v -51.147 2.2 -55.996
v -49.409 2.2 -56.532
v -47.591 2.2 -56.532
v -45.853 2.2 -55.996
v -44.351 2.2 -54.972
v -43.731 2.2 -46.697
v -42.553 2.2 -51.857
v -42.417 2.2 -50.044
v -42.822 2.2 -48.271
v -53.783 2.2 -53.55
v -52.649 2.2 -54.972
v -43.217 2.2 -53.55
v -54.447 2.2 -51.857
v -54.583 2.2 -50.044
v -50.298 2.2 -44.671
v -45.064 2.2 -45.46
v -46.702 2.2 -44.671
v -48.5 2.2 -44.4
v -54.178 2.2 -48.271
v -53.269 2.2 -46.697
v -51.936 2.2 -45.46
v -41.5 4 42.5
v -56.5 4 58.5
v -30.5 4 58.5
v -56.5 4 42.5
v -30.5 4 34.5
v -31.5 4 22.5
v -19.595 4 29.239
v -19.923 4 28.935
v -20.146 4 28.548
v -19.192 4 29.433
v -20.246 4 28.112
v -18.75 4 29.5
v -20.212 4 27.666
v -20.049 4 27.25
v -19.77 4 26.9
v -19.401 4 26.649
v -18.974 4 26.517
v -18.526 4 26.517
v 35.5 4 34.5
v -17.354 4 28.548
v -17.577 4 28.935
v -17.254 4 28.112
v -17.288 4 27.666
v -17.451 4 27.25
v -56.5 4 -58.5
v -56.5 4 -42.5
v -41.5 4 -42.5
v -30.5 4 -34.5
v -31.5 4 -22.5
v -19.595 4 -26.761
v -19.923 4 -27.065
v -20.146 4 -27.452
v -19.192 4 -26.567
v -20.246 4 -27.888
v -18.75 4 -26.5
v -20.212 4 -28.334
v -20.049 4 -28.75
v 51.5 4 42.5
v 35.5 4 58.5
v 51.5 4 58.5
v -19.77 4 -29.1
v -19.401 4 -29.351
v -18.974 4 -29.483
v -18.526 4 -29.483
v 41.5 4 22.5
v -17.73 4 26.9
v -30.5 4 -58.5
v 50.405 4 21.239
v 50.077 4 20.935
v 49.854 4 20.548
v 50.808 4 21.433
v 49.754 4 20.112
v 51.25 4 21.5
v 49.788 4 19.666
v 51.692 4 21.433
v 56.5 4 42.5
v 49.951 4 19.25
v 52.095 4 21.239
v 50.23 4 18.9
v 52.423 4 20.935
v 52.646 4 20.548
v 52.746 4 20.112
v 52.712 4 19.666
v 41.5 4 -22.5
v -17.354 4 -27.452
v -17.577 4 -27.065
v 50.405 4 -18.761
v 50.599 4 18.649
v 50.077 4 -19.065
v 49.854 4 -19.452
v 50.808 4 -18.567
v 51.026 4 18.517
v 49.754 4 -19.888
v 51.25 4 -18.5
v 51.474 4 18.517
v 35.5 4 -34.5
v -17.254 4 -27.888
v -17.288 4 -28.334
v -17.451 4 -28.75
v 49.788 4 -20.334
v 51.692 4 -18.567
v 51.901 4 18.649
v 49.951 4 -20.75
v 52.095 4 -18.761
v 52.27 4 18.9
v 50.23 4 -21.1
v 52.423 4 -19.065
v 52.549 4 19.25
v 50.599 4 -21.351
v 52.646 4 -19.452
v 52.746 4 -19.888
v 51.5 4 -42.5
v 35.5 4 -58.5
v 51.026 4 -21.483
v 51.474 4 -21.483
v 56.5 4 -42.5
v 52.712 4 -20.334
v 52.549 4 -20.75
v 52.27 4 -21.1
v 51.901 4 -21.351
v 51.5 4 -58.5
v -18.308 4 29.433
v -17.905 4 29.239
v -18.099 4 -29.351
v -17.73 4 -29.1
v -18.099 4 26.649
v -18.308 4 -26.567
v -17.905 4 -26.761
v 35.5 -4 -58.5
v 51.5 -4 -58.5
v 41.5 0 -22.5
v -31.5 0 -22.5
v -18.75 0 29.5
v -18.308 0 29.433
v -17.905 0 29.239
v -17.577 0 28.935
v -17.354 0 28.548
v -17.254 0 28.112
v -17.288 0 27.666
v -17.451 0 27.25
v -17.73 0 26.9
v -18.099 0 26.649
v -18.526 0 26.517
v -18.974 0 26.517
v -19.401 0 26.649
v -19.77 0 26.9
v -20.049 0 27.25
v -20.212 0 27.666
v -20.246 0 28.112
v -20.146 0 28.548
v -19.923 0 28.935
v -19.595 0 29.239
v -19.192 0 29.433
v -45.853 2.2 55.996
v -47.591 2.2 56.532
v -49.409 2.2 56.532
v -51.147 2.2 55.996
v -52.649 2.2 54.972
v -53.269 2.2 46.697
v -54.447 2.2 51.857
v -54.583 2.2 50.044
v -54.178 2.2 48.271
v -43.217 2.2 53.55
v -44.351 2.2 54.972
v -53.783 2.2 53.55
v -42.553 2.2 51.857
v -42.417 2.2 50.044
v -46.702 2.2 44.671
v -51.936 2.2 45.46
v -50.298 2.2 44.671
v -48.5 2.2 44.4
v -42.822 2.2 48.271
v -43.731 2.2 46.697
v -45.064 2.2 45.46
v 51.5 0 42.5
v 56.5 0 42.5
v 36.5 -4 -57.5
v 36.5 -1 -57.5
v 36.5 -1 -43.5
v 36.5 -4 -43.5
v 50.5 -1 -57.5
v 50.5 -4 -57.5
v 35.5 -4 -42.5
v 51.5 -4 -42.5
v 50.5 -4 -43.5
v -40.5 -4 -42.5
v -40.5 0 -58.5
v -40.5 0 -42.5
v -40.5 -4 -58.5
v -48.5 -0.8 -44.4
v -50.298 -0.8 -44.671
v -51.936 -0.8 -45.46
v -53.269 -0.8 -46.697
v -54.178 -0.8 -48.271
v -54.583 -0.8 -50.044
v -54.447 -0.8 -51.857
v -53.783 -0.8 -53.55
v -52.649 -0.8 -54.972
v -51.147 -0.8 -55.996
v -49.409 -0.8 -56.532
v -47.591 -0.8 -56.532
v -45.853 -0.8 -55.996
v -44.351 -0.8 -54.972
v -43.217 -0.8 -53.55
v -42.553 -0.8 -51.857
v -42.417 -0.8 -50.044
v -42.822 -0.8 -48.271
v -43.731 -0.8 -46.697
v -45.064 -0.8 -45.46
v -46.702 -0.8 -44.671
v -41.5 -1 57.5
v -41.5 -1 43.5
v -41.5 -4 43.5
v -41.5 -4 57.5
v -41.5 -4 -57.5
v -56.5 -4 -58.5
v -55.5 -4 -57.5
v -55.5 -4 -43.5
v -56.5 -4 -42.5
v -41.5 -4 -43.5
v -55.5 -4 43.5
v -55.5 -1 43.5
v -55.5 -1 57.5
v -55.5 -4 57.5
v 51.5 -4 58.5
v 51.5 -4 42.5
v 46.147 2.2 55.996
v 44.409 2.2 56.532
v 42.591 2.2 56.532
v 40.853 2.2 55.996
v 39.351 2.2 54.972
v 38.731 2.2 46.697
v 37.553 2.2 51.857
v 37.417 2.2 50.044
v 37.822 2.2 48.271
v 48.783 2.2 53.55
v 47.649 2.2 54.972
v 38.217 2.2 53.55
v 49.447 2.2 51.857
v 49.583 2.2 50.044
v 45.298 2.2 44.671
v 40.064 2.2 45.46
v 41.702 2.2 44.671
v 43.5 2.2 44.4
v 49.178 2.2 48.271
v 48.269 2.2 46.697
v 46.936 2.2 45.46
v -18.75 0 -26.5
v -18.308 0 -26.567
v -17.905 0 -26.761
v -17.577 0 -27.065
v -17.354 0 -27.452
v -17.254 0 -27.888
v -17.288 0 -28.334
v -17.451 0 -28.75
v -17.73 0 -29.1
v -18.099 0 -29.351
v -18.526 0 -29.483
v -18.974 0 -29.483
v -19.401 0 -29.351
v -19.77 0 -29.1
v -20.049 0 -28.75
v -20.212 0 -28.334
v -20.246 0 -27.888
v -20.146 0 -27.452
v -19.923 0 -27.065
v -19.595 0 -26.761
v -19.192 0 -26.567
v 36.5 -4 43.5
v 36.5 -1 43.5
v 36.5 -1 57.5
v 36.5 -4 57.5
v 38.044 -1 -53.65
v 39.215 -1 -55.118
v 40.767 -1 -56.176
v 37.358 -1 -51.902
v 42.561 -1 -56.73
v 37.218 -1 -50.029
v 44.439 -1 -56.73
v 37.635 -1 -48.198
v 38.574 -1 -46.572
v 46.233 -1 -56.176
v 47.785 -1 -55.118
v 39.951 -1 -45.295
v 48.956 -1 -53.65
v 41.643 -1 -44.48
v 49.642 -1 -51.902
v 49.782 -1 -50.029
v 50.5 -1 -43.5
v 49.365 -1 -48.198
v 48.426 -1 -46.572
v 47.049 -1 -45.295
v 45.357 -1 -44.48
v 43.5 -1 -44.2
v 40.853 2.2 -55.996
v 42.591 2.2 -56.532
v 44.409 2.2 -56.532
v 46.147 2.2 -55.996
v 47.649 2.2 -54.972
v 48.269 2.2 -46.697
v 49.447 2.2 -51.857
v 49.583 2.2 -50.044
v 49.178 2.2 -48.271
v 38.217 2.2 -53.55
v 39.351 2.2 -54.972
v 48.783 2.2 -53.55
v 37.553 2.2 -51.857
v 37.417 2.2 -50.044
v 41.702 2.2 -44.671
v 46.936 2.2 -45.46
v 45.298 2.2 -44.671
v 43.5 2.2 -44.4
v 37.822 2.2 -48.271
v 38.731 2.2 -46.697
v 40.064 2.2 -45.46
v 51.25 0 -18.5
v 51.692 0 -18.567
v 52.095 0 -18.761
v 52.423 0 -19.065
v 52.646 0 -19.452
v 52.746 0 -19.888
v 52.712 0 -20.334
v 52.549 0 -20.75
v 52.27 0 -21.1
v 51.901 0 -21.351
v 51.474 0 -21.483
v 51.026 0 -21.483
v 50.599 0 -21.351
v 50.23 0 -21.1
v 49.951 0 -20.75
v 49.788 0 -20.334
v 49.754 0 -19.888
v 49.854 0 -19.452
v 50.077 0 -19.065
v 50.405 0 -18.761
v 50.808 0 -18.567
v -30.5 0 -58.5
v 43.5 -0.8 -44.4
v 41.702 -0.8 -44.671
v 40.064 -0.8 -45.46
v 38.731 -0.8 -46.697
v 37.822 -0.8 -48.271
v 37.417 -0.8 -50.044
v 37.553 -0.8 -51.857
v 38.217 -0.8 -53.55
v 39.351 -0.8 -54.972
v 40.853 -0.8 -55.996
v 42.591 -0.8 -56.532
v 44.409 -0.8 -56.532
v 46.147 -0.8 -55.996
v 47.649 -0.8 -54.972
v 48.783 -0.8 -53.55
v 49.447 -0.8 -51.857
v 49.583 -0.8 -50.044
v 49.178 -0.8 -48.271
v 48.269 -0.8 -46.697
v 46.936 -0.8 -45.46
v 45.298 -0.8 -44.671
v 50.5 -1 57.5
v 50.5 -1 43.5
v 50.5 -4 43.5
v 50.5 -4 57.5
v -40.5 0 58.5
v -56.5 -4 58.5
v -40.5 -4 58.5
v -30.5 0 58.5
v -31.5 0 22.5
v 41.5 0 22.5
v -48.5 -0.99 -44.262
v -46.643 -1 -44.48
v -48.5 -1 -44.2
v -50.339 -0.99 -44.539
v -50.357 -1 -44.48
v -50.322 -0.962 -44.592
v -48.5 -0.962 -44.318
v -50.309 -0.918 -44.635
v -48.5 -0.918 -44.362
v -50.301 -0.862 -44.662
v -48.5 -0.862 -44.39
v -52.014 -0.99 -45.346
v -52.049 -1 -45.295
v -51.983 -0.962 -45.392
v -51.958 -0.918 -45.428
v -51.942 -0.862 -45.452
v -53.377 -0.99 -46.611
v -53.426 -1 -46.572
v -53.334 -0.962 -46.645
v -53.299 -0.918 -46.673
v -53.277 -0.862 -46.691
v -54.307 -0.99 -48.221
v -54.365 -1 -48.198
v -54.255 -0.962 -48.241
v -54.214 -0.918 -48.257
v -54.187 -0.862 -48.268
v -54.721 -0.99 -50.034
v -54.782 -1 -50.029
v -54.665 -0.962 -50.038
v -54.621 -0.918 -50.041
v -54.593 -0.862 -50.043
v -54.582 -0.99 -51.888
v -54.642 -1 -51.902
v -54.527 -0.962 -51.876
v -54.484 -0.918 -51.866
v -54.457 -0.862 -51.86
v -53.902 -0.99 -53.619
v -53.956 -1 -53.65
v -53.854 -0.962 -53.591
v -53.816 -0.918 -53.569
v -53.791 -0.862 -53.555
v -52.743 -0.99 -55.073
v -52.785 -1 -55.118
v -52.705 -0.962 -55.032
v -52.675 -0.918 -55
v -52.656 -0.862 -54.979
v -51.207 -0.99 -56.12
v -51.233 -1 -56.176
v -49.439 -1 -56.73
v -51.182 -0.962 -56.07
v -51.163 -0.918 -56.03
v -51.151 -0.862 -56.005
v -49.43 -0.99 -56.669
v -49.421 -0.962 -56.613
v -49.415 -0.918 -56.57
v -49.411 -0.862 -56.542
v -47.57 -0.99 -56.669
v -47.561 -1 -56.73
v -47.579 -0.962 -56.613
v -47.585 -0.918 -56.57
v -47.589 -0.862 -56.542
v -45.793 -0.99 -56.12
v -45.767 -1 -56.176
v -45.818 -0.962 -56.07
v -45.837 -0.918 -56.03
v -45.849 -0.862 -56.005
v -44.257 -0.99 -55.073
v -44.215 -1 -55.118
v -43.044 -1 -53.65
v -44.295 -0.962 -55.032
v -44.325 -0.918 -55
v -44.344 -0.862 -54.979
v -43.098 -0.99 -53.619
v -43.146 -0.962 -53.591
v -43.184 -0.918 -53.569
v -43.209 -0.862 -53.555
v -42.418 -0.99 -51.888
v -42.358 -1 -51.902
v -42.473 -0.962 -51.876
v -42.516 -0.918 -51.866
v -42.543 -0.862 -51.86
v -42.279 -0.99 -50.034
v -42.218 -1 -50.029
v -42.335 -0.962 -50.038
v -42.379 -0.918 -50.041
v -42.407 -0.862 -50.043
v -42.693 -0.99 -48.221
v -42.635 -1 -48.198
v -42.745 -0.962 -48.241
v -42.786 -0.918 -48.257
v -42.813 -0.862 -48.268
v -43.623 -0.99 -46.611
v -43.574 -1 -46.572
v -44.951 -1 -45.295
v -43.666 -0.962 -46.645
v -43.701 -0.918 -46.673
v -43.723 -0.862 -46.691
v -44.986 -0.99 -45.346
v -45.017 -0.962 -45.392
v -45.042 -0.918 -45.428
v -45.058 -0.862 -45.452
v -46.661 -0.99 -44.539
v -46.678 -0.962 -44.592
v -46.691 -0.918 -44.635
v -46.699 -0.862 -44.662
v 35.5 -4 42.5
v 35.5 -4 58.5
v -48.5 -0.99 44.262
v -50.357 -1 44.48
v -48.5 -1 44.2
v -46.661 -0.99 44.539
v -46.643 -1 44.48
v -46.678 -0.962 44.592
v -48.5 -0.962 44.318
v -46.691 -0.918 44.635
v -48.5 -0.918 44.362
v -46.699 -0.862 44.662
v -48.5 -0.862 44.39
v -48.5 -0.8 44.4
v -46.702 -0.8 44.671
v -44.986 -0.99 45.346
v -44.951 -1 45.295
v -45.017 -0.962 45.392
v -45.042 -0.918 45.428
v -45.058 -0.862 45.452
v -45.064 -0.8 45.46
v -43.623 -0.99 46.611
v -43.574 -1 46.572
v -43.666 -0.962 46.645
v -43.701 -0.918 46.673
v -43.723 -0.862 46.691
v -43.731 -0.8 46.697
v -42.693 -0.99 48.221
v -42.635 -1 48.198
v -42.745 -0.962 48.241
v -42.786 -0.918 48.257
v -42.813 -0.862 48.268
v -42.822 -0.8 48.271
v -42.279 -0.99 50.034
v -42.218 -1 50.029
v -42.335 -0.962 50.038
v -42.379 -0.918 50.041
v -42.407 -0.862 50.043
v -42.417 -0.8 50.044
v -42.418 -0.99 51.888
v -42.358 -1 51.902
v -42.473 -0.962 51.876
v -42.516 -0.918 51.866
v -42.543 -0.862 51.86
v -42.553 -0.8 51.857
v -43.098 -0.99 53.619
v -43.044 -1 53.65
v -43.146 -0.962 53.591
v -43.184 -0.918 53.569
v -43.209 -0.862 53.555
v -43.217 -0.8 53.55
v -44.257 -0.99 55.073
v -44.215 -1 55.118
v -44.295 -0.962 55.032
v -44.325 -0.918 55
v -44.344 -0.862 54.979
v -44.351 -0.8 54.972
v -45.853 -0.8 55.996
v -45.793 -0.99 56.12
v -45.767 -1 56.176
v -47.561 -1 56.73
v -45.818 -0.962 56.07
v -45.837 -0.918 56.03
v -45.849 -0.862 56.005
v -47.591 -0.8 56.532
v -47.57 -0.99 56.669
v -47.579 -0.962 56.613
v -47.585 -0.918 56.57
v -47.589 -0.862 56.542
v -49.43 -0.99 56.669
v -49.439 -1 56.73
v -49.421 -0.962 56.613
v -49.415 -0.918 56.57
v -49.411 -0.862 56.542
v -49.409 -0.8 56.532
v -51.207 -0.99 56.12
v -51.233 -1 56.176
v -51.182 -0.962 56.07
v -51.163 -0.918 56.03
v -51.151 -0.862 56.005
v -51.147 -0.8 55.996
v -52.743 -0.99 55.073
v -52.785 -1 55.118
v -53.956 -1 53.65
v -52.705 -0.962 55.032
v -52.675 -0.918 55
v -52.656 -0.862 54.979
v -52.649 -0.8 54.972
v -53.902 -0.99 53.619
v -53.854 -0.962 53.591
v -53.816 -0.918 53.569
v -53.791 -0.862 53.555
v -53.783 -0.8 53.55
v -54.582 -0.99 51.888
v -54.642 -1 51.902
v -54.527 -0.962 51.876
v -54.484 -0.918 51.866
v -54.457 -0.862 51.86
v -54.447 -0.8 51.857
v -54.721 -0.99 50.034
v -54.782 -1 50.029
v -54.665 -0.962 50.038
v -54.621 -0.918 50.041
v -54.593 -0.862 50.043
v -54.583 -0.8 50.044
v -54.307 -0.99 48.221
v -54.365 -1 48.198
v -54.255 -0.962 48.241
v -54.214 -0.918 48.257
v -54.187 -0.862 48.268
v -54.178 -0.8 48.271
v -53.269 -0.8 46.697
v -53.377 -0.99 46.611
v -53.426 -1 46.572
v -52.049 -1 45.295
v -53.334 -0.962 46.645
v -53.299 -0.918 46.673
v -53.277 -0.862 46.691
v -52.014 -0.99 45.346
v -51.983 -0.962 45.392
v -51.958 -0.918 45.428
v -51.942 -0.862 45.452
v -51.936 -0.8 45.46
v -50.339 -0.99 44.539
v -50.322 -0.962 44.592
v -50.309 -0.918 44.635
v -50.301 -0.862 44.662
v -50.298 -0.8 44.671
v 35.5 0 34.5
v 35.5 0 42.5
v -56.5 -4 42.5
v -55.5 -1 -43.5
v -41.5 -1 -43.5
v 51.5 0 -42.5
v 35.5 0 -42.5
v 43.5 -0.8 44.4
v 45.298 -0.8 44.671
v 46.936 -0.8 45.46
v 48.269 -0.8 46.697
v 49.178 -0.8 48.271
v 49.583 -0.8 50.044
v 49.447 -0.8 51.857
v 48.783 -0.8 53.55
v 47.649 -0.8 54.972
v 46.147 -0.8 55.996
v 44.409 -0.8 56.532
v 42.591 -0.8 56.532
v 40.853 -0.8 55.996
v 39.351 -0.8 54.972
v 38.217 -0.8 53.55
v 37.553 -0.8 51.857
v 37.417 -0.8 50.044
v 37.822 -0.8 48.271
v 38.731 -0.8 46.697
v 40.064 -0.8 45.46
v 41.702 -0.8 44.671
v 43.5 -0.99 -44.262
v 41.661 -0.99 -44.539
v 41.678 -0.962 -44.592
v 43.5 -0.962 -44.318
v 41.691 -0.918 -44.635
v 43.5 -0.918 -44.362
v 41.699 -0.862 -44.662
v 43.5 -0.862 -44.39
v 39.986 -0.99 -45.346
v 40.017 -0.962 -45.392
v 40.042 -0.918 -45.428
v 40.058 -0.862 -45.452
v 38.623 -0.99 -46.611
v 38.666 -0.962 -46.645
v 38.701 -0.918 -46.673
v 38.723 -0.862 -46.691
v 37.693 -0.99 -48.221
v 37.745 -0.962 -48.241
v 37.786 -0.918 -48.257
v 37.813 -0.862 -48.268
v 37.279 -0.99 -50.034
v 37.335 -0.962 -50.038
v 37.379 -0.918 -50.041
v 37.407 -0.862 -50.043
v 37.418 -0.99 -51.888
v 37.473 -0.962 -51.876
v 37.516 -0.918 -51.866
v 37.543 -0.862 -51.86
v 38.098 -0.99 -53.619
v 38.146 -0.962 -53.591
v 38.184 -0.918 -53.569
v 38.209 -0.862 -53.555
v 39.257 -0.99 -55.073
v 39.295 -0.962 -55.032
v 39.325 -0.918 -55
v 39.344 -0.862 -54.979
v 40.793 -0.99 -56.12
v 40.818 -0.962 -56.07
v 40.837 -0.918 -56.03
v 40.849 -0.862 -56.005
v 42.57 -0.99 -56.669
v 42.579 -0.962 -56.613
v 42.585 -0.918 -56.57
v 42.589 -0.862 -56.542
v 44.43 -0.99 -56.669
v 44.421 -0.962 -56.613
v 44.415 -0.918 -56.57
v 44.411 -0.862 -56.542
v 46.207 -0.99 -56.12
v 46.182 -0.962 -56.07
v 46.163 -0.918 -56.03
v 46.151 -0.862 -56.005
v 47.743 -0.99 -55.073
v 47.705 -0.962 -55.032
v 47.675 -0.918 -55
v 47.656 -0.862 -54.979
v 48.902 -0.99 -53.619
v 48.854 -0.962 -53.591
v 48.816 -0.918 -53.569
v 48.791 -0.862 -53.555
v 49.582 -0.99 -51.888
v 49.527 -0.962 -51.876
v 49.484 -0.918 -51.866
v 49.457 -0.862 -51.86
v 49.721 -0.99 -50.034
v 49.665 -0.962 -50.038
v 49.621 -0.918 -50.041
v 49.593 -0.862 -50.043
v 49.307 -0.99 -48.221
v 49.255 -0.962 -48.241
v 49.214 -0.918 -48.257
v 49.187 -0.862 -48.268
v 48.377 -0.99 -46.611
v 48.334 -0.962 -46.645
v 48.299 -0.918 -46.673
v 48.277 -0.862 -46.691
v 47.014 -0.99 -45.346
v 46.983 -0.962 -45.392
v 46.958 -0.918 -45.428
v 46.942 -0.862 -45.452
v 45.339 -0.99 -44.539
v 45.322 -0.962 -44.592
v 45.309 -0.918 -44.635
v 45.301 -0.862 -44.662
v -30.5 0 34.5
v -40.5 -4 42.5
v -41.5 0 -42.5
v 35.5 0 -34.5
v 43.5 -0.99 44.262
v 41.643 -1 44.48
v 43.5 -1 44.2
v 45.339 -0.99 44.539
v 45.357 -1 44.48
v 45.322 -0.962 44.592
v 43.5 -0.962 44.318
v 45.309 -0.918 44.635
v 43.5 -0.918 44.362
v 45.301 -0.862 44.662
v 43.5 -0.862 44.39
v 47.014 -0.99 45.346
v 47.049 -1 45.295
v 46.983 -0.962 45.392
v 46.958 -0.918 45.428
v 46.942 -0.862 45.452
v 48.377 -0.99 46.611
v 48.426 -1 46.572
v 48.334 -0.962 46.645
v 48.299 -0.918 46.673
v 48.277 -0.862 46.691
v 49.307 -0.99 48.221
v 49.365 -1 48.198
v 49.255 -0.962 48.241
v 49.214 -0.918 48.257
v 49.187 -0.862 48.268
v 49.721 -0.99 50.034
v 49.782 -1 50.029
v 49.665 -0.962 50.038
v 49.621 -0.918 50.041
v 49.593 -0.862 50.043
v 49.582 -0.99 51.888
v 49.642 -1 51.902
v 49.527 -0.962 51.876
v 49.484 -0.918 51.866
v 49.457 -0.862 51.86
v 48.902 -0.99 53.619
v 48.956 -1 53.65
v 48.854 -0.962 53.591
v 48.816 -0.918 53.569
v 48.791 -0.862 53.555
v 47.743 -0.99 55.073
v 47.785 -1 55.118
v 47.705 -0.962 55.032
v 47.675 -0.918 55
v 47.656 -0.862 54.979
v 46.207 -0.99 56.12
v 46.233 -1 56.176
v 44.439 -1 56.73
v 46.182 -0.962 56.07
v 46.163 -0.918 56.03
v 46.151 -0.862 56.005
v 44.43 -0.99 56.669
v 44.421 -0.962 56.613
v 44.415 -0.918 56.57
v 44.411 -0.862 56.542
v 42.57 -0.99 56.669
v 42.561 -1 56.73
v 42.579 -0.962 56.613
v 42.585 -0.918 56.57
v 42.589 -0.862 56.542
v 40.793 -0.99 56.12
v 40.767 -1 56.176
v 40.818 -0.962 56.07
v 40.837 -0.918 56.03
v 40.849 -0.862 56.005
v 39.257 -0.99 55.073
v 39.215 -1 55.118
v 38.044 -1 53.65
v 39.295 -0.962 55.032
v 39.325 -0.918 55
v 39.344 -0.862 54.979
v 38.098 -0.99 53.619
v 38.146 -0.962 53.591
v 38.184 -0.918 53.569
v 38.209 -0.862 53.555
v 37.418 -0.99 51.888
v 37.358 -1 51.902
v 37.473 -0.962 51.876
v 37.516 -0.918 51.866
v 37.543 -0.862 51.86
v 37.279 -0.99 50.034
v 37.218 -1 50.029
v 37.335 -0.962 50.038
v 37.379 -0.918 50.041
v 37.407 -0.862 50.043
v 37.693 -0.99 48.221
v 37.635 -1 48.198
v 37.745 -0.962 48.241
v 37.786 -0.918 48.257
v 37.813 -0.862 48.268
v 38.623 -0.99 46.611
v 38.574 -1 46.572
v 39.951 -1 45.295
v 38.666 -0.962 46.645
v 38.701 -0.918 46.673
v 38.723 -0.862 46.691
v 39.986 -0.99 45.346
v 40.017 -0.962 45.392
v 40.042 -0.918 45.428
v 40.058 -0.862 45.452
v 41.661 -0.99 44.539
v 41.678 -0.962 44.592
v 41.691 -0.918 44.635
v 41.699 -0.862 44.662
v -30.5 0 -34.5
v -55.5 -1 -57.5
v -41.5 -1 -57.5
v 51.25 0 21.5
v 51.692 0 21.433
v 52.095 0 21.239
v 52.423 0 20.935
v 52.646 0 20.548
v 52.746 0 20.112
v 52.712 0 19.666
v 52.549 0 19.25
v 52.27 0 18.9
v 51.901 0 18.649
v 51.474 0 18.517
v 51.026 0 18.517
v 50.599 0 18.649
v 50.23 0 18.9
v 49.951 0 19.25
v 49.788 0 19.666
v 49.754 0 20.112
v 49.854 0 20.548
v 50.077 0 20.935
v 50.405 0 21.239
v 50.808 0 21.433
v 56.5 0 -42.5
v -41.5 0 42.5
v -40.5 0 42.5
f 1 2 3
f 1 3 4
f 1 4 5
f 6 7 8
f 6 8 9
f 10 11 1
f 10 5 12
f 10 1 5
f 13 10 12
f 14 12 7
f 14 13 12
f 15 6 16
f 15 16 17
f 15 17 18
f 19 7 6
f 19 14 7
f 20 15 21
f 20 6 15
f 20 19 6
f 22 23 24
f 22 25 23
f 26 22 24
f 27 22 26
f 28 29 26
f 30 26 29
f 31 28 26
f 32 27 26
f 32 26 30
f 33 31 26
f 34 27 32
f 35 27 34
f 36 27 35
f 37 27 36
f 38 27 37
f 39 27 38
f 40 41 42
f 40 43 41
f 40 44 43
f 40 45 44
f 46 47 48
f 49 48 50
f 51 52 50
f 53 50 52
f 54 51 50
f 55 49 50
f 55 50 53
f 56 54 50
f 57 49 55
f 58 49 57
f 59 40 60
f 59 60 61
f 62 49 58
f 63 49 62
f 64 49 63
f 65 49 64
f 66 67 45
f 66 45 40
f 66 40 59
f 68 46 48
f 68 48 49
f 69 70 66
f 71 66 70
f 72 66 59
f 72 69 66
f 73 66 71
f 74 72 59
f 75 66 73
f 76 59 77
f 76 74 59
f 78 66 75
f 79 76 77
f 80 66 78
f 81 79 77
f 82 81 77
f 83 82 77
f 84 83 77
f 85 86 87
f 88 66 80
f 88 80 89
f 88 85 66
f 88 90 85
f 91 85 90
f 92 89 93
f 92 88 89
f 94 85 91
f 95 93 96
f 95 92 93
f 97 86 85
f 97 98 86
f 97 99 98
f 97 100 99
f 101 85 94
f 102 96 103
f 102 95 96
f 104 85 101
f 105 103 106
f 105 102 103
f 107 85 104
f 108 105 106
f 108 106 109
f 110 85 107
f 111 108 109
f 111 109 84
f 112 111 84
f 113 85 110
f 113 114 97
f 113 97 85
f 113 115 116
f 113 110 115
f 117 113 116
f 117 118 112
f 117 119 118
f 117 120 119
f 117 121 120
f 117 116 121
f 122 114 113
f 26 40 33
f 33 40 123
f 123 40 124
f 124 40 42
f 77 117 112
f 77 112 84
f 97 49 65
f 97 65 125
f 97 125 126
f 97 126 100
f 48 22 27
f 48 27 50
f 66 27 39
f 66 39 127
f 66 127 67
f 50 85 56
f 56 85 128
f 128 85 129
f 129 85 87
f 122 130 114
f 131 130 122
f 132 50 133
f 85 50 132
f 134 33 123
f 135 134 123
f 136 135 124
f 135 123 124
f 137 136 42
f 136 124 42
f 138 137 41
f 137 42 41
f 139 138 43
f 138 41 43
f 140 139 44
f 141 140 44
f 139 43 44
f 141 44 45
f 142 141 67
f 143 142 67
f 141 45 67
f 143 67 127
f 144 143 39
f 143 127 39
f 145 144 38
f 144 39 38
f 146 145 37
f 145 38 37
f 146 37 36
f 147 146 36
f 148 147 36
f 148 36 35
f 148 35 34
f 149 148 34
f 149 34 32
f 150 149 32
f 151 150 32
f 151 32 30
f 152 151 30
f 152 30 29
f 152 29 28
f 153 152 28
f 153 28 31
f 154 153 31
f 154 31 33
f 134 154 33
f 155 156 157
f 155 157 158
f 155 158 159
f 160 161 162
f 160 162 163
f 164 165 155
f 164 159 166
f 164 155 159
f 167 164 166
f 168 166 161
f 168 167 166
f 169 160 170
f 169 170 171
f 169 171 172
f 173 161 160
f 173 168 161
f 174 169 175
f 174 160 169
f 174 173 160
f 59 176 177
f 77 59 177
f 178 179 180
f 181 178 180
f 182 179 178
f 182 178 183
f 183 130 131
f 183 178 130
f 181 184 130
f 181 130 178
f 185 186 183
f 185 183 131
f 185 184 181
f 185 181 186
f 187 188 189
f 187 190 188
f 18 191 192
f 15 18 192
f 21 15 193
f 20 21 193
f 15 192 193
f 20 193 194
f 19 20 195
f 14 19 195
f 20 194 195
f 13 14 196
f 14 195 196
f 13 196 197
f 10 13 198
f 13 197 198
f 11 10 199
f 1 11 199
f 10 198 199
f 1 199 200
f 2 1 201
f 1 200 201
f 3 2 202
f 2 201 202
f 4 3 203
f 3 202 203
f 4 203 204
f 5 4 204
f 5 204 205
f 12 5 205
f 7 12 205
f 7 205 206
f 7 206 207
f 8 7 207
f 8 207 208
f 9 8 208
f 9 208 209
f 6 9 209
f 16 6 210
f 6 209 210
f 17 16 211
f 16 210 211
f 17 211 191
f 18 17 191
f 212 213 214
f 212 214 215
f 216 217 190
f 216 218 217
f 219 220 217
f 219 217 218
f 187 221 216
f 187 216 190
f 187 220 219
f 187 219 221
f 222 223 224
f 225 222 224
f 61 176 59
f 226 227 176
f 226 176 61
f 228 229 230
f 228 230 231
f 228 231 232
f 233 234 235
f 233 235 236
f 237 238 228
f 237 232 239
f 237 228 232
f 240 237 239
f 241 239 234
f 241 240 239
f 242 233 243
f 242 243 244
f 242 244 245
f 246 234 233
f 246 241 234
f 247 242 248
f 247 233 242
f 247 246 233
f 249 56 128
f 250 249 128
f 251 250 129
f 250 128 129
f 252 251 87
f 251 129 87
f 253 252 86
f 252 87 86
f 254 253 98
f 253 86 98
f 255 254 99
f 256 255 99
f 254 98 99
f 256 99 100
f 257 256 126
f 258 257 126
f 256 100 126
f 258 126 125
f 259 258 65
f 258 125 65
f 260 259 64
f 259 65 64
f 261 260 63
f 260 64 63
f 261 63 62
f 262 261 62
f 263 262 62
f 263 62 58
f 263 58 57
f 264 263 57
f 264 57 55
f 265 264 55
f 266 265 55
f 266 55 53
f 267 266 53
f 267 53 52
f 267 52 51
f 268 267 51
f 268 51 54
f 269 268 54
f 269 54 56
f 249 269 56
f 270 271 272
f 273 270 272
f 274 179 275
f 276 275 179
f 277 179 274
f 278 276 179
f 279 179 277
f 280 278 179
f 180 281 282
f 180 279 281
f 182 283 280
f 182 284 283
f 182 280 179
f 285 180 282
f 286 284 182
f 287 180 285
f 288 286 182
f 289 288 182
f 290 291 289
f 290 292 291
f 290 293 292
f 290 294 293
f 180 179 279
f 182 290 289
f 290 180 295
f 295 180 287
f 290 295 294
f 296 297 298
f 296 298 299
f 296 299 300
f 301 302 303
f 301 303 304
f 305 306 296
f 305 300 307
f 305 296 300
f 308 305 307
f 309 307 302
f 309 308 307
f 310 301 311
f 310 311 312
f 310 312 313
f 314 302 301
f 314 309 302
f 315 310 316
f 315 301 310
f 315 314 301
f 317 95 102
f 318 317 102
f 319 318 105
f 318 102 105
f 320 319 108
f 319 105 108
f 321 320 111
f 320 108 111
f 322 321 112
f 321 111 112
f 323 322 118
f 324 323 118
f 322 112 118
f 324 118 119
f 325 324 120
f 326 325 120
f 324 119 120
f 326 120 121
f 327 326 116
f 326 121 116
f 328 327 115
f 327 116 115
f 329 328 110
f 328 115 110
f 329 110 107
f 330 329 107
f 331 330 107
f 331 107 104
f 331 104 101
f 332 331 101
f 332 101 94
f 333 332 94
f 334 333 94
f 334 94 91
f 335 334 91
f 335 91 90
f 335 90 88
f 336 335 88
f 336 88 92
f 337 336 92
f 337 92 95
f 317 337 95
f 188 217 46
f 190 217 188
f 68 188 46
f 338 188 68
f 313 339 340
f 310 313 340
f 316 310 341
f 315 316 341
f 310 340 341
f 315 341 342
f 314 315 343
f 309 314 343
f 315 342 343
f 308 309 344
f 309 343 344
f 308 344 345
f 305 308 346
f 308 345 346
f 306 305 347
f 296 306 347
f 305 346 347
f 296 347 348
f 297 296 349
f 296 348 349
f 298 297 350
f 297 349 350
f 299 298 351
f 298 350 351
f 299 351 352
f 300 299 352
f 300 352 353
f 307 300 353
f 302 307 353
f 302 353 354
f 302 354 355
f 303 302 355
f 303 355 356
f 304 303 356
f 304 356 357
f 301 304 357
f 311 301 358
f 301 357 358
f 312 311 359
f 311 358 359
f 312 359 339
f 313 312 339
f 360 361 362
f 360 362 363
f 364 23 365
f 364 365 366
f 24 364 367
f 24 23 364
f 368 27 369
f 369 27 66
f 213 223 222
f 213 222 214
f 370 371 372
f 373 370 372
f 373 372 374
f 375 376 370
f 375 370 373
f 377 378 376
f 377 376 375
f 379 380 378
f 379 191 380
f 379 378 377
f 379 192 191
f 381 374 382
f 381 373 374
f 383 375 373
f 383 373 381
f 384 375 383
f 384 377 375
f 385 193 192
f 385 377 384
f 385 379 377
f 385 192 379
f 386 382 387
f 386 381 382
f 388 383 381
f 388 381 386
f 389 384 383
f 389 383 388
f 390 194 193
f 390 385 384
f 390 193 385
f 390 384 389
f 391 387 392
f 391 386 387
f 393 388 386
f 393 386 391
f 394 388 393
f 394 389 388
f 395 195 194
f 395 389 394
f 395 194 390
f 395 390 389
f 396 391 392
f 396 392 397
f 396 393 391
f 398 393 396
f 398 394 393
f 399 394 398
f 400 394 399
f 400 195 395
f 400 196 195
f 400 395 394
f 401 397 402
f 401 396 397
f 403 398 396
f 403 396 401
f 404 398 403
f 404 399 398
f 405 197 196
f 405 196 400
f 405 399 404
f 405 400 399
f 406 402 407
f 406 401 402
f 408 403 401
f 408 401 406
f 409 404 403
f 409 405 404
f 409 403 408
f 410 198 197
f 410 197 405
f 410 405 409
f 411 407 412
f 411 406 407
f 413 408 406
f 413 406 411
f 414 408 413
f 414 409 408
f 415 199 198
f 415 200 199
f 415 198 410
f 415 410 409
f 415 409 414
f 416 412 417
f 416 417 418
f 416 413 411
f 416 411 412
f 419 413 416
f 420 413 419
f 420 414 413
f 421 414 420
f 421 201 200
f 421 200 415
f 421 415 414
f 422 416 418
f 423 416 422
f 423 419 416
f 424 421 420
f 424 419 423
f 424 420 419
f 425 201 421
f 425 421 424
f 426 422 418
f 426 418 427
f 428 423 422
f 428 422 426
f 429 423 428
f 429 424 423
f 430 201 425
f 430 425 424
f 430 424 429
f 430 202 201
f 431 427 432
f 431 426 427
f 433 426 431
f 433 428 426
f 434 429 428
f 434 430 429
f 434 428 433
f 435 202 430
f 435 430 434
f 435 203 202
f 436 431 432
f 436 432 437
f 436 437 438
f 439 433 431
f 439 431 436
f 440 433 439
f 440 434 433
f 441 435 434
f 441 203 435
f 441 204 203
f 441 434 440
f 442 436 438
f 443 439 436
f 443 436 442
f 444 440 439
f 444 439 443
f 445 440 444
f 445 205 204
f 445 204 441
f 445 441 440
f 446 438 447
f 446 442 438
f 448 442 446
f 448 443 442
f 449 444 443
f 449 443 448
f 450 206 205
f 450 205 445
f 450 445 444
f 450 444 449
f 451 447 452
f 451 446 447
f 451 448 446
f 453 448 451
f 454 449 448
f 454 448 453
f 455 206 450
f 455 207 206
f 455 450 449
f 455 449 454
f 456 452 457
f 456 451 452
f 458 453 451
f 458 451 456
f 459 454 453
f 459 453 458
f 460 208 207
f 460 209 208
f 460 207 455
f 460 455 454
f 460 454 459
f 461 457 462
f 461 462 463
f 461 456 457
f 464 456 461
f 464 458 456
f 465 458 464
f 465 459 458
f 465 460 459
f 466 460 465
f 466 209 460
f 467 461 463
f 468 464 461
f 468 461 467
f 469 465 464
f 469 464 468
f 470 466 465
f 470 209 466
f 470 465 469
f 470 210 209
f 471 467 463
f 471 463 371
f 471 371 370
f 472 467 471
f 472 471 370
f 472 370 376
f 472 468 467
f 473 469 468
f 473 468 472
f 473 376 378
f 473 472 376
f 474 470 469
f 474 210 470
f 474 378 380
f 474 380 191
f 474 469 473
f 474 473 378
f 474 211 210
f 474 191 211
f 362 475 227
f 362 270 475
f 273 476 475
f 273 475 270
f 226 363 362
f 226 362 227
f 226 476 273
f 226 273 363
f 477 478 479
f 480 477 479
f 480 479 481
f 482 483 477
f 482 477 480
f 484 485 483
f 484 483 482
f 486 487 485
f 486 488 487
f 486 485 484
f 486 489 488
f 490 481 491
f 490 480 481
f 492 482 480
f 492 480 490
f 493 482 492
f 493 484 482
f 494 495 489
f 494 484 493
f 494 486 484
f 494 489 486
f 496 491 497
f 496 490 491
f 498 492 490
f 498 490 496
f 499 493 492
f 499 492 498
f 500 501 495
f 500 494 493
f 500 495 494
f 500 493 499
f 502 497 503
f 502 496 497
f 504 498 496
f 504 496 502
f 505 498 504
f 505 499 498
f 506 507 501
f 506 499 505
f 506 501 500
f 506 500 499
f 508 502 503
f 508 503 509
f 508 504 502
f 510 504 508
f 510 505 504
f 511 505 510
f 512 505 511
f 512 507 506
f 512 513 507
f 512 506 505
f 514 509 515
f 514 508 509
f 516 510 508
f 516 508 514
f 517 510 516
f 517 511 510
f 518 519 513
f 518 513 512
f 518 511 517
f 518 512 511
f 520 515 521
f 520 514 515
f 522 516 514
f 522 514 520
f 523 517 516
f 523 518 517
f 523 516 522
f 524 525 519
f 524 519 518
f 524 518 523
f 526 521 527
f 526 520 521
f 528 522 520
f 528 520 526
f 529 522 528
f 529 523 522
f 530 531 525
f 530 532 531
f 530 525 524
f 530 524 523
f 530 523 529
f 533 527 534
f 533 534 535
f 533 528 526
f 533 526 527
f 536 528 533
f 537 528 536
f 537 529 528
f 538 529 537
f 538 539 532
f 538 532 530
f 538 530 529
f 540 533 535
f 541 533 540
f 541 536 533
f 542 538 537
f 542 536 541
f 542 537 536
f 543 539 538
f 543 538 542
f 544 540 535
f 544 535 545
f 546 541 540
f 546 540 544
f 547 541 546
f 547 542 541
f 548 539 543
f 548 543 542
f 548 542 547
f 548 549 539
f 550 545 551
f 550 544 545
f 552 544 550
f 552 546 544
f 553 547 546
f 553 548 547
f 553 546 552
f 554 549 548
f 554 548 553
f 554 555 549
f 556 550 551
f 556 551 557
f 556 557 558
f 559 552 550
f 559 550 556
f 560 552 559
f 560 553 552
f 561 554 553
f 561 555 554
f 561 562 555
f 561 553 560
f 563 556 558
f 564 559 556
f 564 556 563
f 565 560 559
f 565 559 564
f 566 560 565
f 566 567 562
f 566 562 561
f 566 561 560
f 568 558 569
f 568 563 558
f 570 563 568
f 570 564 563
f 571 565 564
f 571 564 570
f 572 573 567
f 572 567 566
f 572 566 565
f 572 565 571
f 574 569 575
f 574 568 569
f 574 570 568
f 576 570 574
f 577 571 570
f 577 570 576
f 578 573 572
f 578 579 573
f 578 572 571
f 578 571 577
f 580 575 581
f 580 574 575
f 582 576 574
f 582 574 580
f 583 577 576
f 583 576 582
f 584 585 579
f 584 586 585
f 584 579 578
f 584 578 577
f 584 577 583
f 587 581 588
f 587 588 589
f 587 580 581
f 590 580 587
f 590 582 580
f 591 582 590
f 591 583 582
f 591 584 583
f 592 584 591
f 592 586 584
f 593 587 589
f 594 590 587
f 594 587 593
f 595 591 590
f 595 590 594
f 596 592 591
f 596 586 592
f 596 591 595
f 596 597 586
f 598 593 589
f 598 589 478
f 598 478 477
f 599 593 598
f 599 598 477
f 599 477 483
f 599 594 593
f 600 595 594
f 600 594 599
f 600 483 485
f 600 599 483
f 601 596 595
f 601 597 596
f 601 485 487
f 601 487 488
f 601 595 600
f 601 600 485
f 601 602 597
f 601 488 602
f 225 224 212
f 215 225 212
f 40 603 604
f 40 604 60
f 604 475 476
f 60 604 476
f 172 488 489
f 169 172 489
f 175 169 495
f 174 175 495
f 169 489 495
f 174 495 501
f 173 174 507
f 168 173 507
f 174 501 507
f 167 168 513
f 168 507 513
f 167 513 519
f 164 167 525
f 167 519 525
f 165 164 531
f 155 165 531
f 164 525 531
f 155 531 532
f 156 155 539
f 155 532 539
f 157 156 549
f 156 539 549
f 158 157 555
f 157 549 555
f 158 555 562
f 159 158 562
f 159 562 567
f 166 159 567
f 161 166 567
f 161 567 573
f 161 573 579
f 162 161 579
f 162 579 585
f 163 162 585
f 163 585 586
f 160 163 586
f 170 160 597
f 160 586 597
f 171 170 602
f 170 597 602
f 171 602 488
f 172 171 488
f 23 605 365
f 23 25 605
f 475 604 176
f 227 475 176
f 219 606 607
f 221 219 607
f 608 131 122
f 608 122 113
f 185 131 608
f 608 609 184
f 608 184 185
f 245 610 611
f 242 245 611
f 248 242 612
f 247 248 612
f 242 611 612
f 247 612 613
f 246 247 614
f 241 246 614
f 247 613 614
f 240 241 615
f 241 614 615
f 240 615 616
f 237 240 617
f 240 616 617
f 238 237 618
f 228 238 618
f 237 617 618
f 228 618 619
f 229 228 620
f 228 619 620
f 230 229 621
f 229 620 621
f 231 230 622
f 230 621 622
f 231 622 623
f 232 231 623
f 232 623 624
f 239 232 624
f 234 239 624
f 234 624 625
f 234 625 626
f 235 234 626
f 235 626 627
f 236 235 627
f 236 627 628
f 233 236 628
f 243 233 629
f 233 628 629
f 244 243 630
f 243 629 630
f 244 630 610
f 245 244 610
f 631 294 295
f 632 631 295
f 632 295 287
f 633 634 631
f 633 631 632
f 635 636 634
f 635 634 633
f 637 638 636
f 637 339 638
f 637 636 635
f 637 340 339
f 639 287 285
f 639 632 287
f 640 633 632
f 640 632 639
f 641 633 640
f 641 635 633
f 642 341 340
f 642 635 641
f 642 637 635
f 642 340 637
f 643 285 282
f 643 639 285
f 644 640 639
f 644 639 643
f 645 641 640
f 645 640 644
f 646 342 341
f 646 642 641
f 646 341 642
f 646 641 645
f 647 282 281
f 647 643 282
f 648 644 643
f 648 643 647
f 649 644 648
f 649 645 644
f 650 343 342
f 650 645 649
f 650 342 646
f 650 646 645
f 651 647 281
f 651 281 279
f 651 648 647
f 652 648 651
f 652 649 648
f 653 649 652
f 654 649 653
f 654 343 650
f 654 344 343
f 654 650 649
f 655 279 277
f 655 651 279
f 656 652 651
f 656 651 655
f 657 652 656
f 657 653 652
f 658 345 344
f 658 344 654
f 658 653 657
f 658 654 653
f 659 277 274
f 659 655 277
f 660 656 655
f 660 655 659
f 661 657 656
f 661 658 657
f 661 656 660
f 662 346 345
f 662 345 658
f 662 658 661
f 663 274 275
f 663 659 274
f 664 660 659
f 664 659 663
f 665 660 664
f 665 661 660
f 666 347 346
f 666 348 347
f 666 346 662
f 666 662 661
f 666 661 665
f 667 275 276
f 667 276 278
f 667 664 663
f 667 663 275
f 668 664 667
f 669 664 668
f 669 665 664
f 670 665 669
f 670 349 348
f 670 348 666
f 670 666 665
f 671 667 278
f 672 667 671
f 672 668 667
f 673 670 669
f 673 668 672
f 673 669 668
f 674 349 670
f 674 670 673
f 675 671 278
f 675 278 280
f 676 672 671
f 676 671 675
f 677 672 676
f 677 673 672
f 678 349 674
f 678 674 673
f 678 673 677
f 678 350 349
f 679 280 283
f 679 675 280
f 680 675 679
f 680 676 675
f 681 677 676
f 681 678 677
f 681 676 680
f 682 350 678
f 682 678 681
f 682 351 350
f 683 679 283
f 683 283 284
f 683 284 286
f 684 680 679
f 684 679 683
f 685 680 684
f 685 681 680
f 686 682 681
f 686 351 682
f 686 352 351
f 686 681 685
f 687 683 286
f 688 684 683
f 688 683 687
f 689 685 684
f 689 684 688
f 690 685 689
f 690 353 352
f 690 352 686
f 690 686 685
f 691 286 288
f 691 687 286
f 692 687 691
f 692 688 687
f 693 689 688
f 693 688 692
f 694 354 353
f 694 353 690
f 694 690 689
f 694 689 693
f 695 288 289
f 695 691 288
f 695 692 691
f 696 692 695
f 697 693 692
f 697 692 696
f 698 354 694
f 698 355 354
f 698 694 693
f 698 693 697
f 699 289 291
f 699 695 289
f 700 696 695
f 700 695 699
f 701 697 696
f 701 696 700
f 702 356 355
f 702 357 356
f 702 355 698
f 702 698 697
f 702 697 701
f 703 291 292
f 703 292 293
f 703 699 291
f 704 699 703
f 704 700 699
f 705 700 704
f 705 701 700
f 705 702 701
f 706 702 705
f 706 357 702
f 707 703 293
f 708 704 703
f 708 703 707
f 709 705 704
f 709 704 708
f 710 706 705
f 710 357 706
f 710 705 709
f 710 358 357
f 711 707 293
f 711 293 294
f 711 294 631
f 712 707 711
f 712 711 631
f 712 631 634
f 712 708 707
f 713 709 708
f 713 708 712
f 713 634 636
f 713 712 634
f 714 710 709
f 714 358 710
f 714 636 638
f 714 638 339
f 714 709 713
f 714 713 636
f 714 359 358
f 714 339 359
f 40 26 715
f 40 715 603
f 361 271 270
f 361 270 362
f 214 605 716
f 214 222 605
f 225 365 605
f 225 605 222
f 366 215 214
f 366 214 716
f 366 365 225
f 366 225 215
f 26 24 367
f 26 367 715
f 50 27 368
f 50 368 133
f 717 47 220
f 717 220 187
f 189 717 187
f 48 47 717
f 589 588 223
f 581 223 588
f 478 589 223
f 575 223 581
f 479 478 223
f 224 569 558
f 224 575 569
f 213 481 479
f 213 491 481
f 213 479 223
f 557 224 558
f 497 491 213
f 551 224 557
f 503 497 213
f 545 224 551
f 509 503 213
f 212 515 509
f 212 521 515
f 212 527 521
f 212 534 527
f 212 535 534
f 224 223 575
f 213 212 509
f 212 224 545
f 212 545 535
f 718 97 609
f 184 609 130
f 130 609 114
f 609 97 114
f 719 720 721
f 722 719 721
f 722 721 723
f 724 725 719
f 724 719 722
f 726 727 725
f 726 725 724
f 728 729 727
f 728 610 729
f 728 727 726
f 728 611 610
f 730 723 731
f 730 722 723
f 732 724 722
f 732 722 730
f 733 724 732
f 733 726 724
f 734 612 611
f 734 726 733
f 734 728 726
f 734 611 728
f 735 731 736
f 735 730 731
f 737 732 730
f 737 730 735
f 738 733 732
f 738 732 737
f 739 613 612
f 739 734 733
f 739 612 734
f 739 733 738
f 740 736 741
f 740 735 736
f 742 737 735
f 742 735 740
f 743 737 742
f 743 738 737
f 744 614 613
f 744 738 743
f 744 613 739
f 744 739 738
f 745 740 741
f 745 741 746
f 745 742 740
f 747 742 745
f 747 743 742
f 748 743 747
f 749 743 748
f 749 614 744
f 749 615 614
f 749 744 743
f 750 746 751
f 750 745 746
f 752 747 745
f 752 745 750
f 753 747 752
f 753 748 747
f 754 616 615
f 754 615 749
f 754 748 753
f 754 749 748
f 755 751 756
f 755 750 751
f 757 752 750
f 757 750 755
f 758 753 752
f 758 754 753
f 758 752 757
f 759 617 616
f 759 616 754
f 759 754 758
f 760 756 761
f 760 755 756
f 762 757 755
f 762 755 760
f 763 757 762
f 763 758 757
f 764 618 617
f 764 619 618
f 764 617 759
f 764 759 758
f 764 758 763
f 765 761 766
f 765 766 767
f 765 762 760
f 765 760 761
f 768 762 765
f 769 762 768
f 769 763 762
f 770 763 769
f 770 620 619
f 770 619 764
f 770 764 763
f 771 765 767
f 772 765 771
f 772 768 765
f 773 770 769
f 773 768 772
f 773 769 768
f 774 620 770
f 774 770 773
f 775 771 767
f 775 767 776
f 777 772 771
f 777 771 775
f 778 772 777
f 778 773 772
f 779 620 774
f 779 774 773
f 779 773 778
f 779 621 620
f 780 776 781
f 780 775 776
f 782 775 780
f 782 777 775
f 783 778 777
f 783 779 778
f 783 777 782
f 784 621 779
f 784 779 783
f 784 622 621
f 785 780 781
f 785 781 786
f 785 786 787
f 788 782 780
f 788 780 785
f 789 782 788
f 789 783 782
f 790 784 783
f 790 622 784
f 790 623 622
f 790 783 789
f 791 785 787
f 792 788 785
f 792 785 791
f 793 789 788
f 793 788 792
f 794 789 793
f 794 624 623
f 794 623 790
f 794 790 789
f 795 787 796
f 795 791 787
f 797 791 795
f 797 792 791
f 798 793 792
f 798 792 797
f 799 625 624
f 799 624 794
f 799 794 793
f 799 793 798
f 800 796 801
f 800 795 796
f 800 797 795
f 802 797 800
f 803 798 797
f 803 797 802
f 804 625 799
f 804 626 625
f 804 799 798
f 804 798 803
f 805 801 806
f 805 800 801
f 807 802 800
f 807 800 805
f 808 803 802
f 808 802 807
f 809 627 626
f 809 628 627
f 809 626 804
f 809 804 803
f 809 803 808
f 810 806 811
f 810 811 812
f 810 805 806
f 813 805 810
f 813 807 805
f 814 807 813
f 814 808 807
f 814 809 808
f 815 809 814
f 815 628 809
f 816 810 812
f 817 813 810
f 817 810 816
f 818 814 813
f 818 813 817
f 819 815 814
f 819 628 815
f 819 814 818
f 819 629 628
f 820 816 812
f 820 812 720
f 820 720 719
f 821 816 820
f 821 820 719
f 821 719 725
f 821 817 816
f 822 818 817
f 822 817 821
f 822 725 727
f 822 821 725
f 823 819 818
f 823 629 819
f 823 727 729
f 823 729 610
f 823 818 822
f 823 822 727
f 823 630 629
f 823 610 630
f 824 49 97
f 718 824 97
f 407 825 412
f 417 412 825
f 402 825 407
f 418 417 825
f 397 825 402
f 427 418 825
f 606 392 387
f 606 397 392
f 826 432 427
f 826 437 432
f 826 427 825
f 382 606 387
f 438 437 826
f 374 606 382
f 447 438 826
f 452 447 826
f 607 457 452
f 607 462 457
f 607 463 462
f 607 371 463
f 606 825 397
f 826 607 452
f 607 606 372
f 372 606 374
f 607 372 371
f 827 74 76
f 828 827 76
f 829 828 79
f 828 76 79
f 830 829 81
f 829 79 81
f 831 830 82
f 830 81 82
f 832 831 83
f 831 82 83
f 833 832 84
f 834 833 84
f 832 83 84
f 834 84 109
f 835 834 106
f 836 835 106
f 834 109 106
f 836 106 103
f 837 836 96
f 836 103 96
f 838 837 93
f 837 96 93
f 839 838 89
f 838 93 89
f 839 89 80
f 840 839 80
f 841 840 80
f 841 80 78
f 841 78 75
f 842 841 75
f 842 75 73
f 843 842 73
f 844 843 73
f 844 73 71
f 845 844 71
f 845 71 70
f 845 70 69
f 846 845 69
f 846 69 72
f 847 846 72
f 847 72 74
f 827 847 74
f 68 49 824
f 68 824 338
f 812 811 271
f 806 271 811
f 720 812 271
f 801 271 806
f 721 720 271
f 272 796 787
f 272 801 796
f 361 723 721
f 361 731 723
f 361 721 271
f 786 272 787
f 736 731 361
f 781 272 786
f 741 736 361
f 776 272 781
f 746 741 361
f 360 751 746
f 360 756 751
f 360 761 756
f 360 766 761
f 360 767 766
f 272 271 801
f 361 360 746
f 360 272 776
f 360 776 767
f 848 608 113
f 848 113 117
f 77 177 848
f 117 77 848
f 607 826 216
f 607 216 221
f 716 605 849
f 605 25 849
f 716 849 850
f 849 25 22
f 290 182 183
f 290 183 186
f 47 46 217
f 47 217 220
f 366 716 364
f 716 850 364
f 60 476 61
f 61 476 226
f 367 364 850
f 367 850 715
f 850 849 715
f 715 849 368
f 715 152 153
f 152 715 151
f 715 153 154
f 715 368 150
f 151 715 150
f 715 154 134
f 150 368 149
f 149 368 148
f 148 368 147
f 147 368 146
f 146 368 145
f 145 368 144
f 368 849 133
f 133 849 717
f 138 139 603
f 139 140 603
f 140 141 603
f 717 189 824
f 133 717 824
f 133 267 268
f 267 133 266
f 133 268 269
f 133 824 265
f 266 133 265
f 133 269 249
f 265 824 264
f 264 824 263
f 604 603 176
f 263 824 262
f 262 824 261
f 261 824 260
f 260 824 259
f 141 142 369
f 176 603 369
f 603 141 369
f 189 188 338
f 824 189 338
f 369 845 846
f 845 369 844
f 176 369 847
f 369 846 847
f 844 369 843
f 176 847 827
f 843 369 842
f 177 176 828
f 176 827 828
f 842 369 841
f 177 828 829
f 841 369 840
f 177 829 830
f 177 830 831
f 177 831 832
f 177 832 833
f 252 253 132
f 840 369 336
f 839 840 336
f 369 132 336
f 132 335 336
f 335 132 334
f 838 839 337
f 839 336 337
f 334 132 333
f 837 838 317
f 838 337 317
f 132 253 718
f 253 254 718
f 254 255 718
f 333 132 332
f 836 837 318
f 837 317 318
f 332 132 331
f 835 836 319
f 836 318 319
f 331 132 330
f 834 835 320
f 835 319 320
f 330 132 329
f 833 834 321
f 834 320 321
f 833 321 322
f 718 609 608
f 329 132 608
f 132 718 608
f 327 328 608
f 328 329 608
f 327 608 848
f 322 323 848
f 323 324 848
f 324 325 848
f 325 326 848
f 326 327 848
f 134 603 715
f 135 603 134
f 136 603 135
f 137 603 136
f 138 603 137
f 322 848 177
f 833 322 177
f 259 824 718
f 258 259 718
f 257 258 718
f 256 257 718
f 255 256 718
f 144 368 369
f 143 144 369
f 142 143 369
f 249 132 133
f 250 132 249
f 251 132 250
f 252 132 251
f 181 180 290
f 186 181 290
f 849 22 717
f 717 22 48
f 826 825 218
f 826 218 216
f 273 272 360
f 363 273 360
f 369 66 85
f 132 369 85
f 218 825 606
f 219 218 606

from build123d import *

# Parameters (mm, degrees)
SKETCH1_W                       = 113
SKETCH1_H                       = 85
BOSS_EXTRUDE1_DEPTH             = 4
SKETCH2_R                       = 1.5
CUT_EXTRUDE1_DEPTH              = 71.813134375
BOSS_EXTRUDE3_REACH             = 72.813
SKETCH4_W                       = 16
SKETCH4_H                       = 16
BOSS_EXTRUDE3_DIRECTION_2_DEPTH = 1
SKETCH10_W                      = 10
SKETCH10_H                      = 16
BOSS_EXTRUDE6_DEPTH             = 4
SKETCH6_W                       = 73
SKETCH6_H                       = 45
SKETCH6_W_2                     = 15
SKETCH6_H_2                     = 85
SKETCH6_W_3                     = 66
SKETCH6_H_3                     = 8
CUT_EXTRUDE2_DEPTH              = 82.483127088
SKETCH8_R                       = 6.1
CUT_EXTRUDE3_DEPTH              = 3.2
SKETCH9_W                       = 16
SKETCH9_H                       = 16
SKETCH9_W_2                     = 14
SKETCH9_H_2                     = 14
BOSS_EXTRUDE5_DEPTH             = 3
FILLET1_R                       = 0.2


with BuildPart() as part:
    # Sketch1 → Boss-Extrude1 (new body)
    with BuildSketch(Plane(origin=(0, 0, 0), x_dir=(1, 0, 0), z_dir=(0, 1, 0))):
        Rectangle(SKETCH1_W, SKETCH1_H)
    extrude(amount=BOSS_EXTRUDE1_DEPTH)

    # Sketch2 → Cut-Extrude1 (cut, through all)
    with BuildSketch(Plane(origin=(0, 4, 0), x_dir=(1, 0, 0), z_dir=(0, 1, 0))):
        with Locations(Location((-18.75, 28, 0), (0, 0, 270))):
            Circle(SKETCH2_R)
        with Locations(Location((-18.75, -28, 0), (0, 0, 270))):
            Circle(SKETCH2_R)
        with Locations(Location((51.25, -20, 0), (0, 0, 270))):
            Circle(SKETCH2_R)
        with Locations(Location((51.25, 20, 0), (0, 0, 270))):
            Circle(SKETCH2_R)
    extrude(amount=-CUT_EXTRUDE1_DEPTH, mode=Mode.SUBTRACT)

    # Boss-Extrude3: up to this face of the body (flat: up to its plane)
    boss_extrude3_end = Plane(part.part.faces().sort_by_distance((-0.047976515, 4, 0))[0])
    # Sketch4 → Boss-Extrude3 (add, up to the picked face)
    with BuildSketch(Plane.XZ, mode=Mode.PRIVATE) as boss_extrude3_sk1:
        with Locations((-48.5, 50.5)):
            Rectangle(SKETCH4_W, SKETCH4_H)
    boss_extrude3_tool1 = split(extrude(boss_extrude3_sk1.sketch, amount=-BOSS_EXTRUDE3_REACH, mode=Mode.PRIVATE), bisect_by=boss_extrude3_end, keep=Keep.BOTH, mode=Mode.PRIVATE)
    # Sketch4 → Boss-Extrude3 (add, up to the picked face)
    with BuildSketch(Plane.XZ, mode=Mode.PRIVATE) as boss_extrude3_sk2:
        with Locations((43.5, 50.5)):
            Rectangle(SKETCH4_W, SKETCH4_H)
    boss_extrude3_tool2 = split(extrude(boss_extrude3_sk2.sketch, amount=-BOSS_EXTRUDE3_REACH, mode=Mode.PRIVATE), bisect_by=boss_extrude3_end, keep=Keep.BOTH, mode=Mode.PRIVATE)
    # Sketch4 → Boss-Extrude3 (add, up to the picked face)
    with BuildSketch(Plane.XZ, mode=Mode.PRIVATE) as boss_extrude3_sk3:
        with Locations((43.5, -50.5)):
            Rectangle(SKETCH4_W, SKETCH4_H)
    boss_extrude3_tool3 = split(extrude(boss_extrude3_sk3.sketch, amount=-BOSS_EXTRUDE3_REACH, mode=Mode.PRIVATE), bisect_by=boss_extrude3_end, keep=Keep.BOTH, mode=Mode.PRIVATE)
    # Sketch4 → Boss-Extrude3 (add, up to the picked face)
    with BuildSketch(Plane.XZ, mode=Mode.PRIVATE) as boss_extrude3_sk4:
        with Locations((-48.5, -50.5)):
            Rectangle(SKETCH4_W, SKETCH4_H)
    boss_extrude3_tool4 = split(extrude(boss_extrude3_sk4.sketch, amount=-BOSS_EXTRUDE3_REACH, mode=Mode.PRIVATE), bisect_by=boss_extrude3_end, keep=Keep.BOTH, mode=Mode.PRIVATE)
    add(boss_extrude3_tool1.solids().sort_by(Axis((-48.5, 0, 50.5), (0, 1, 0)))[0])
    add(boss_extrude3_tool2.solids().sort_by(Axis((43.5, 0, 50.5), (0, 1, 0)))[0])
    add(boss_extrude3_tool3.solids().sort_by(Axis((43.5, 0, -50.5), (0, 1, 0)))[0])
    add(boss_extrude3_tool4.solids().sort_by(Axis((-48.5, 0, -50.5), (0, 1, 0)))[0])

    # Sketch4 → Boss-Extrude3 direction 2 (add)
    with BuildSketch(Plane.XZ):
        with Locations((-48.5, 50.5)):
            Rectangle(SKETCH4_W, SKETCH4_H)
        with Locations((43.5, 50.5)):
            Rectangle(SKETCH4_W, SKETCH4_H)
        with Locations((43.5, -50.5)):
            Rectangle(SKETCH4_W, SKETCH4_H)
        with Locations((-48.5, -50.5)):
            Rectangle(SKETCH4_W, SKETCH4_H)
    extrude(amount=BOSS_EXTRUDE3_DIRECTION_2_DEPTH)

    # Sketch10 → Boss-Extrude6 (add)
    with BuildSketch(Plane(origin=(0, 4, 0), x_dir=(1, 0, 0), z_dir=(0, 1, 0))):
        with Locations((-35.5, -50.5)):
            Rectangle(SKETCH10_W, SKETCH10_H)
        with Locations((-35.5, 50.5)):
            Rectangle(SKETCH10_W, SKETCH10_H)
    extrude(amount=-BOSS_EXTRUDE6_DEPTH)

    # Sketch6 → Cut-Extrude2 (cut, through all)
    with BuildSketch(Plane(origin=(0, 4, 0), x_dir=(1, 0, 0), z_dir=(0, 1, 0))):
        with Locations((5, 0)):
            Rectangle(SKETCH6_W, SKETCH6_H)
        with Locations((-49, 0)):
            Rectangle(SKETCH6_W_2, SKETCH6_H_2)
        with Locations((2.5, 38.5)):
            Rectangle(SKETCH6_W_3, SKETCH6_H_3)
        with Locations((2.5, -38.5)):
            Rectangle(SKETCH6_W_3, SKETCH6_H_3)
    extrude(amount=-CUT_EXTRUDE2_DEPTH, mode=Mode.SUBTRACT)

    # Sketch8 → Cut-Extrude3 (cut)
    with BuildSketch(Plane.XZ.offset(1)):
        with Locations(Location((-48.5, 50.5, 0), (0, 0, 270))):
            Circle(SKETCH8_R)
        with Locations(Location((43.5, 50.5, 0), (0, 0, 270))):
            Circle(SKETCH8_R)
        with Locations(Location((43.5, -50.5, 0), (0, 0, 90))):
            Circle(SKETCH8_R)
        with Locations(Location((-48.5, -50.5, 0), (0, 0, 90))):
            Circle(SKETCH8_R)
    extrude(amount=-CUT_EXTRUDE3_DEPTH, mode=Mode.SUBTRACT)

    # Sketch9 → Boss-Extrude5 (add)
    # profile 1 of 4: a face of its own
    with BuildSketch(Plane.XZ.offset(1)):
        with Locations((-48.5, 50.5)):
            Rectangle(SKETCH9_W, SKETCH9_H)
        with Locations((-48.5, 50.5)):
            Rectangle(SKETCH9_W_2, SKETCH9_H_2, mode=Mode.SUBTRACT)
    # profile 2 of 4: a face of its own
    with BuildSketch(Plane.XZ.offset(1)):
        with Locations((43.5, 50.5)):
            Rectangle(SKETCH9_W, SKETCH9_H)
        with Locations((43.5, 50.5)):
            Rectangle(SKETCH9_W_2, SKETCH9_H_2, mode=Mode.SUBTRACT)
    # profile 3 of 4: a face of its own
    with BuildSketch(Plane.XZ.offset(1)):
        with Locations((43.5, -50.5)):
            Rectangle(SKETCH9_W, SKETCH9_H)
        with Locations((43.5, -50.5)):
            Rectangle(SKETCH9_W_2, SKETCH9_H_2, mode=Mode.SUBTRACT)
    # profile 4 of 4: a face of its own
    with BuildSketch(Plane.XZ.offset(1)):
        with Locations((-48.5, -50.5)):
            Rectangle(SKETCH9_W, SKETCH9_H)
        with Locations((-48.5, -50.5)):
            Rectangle(SKETCH9_W_2, SKETCH9_H_2, mode=Mode.SUBTRACT)
    extrude(amount=BOSS_EXTRUDE5_DEPTH)

    # Fillet1
    fillet1_edges = [part.edges().sort_by_distance(p)[0] for p in [
        (-48.5, -1, -56.6),
        (43.5, -1, -56.6),
        (43.5, -1, 56.6),
        (-48.5, -1, 56.6),
    ]]
    fillet(fillet1_edges, radius=FILLET1_R)


solid = part.part
